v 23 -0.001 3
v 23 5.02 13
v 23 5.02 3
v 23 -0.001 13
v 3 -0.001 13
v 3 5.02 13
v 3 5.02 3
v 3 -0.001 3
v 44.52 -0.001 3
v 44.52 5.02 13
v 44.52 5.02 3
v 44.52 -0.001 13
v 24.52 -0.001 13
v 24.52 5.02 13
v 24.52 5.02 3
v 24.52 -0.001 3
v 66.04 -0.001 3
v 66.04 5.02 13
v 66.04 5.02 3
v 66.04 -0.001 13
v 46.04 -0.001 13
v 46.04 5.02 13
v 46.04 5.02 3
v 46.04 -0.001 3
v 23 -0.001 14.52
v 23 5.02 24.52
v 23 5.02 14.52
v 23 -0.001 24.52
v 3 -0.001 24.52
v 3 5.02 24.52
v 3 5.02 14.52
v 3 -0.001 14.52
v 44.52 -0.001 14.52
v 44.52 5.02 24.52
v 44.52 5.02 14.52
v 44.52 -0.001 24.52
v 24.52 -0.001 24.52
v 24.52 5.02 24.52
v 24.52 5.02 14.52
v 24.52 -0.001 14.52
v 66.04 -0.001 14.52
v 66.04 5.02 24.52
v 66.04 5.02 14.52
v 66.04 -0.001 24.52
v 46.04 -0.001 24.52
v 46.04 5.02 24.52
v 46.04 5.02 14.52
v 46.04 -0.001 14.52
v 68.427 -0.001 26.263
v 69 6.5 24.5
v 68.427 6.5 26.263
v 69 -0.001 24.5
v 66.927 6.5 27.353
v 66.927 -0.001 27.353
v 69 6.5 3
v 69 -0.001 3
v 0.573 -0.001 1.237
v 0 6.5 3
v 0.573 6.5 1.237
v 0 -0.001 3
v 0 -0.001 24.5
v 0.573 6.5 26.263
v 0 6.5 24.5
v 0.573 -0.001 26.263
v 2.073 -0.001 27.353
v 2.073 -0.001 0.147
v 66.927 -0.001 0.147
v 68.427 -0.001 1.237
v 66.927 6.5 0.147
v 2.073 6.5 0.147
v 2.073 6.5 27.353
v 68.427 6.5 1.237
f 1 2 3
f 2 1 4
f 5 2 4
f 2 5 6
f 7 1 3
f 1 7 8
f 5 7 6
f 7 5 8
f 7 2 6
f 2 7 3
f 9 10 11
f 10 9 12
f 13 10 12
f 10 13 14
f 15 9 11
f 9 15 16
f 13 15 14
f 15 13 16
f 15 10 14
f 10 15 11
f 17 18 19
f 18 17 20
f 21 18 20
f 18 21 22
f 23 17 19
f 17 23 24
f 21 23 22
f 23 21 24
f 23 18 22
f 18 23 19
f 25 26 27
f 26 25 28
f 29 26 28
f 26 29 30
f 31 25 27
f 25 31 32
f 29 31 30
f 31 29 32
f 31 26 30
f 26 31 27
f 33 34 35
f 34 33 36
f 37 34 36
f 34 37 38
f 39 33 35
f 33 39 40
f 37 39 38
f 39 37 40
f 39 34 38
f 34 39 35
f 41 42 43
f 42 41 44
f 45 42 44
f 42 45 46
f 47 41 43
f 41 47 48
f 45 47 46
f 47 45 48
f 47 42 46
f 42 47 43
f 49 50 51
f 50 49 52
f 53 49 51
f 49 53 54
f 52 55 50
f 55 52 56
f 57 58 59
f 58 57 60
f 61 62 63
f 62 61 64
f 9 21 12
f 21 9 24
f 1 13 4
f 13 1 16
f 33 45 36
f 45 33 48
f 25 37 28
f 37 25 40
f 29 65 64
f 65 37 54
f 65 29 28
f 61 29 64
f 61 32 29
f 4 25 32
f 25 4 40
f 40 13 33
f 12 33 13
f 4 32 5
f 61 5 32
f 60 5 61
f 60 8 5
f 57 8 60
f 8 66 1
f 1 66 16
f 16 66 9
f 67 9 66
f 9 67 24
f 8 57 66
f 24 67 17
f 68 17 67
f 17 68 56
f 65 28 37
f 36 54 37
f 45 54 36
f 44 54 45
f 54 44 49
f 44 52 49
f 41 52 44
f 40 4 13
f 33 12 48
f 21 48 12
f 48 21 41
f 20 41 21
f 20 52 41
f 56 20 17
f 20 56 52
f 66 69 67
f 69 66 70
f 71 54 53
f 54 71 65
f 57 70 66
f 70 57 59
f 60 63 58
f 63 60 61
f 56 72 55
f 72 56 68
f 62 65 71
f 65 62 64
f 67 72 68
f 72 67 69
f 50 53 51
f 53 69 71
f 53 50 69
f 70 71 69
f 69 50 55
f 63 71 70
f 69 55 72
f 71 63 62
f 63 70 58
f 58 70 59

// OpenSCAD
Inner_height = 10;
Inner_width = 20;
Inner_depth = 5;
Thickness = 1.5;
No_Boxes_high = 2;
No_Boxes_wide = 3;
Back = true;
Rounded_Corners = true;
Corner_Radius = 3;

box_red = 100/255;
box_green = 50/255;
box_blue = 0/255;
c_color = 180/255;
cut_color = [c_color,c_color,c_color];
MainBox_Color = [box_red,box_green,box_blue];
Outer_height = Inner_height*No_Boxes_high+Thickness*(No_Boxes_high+1);
Outer_width = Inner_width*No_Boxes_wide+Thickness*(No_Boxes_wide+1);
Outer_depth = (Back) ? Inner_depth+Thickness:Inner_depth;
True_height = (Rounded_Corners) ? Outer_height-Corner_Radius:Outer_height;
True_width = (Rounded_Corners) ? Outer_width-Corner_Radius:Outer_width;
extra = 0+0.02;
cut_offset = (Rounded_Corners) ? [Corner_Radius/2,0,Corner_Radius/2]:[0,0,0];
module Main_Box() {
     color(c = MainBox_Color)
     cube([
     True_width,
     Outer_depth,
     True_height]);
};
module Cut_outs() {
    translate(cut_offset)
        for (i=[0:No_Boxes_high-1]){
            translate([0,0,i*(Inner_height+Thickness+extra)])    
                translate([Thickness,-extra,Thickness])
                    color(c = cut_color)
                    cube([
                    Inner_width,
                    Inner_depth+extra*2,
                    Inner_height]);
            for (j=[0:No_Boxes_wide-1]){
                translate([j*(Inner_width+Thickness+extra),0,i*(Inner_height+Thickness+extra)])    
                    translate([Thickness,-extra,Thickness])
                        color(c = cut_color)
                        cube([
                        Inner_width,
                        Inner_depth+extra*2,
                        Inner_height]);
        };
    };
};
module Fillet(){
    color(c = MainBox_Color)
    minkowski(){
    translate([Corner_Radius,0,Corner_Radius])
        Main_Box();
    translate([])    
        rotate([90,0,0])
           cylinder(r=Corner_Radius,h=0.001); 
    };
};

module Full_Box() {
    difference(){
        if (Rounded_Corners) Fillet();
        if (!Rounded_Corners) Main_Box();
        Cut_outs();
    };
};

Full_Box();
